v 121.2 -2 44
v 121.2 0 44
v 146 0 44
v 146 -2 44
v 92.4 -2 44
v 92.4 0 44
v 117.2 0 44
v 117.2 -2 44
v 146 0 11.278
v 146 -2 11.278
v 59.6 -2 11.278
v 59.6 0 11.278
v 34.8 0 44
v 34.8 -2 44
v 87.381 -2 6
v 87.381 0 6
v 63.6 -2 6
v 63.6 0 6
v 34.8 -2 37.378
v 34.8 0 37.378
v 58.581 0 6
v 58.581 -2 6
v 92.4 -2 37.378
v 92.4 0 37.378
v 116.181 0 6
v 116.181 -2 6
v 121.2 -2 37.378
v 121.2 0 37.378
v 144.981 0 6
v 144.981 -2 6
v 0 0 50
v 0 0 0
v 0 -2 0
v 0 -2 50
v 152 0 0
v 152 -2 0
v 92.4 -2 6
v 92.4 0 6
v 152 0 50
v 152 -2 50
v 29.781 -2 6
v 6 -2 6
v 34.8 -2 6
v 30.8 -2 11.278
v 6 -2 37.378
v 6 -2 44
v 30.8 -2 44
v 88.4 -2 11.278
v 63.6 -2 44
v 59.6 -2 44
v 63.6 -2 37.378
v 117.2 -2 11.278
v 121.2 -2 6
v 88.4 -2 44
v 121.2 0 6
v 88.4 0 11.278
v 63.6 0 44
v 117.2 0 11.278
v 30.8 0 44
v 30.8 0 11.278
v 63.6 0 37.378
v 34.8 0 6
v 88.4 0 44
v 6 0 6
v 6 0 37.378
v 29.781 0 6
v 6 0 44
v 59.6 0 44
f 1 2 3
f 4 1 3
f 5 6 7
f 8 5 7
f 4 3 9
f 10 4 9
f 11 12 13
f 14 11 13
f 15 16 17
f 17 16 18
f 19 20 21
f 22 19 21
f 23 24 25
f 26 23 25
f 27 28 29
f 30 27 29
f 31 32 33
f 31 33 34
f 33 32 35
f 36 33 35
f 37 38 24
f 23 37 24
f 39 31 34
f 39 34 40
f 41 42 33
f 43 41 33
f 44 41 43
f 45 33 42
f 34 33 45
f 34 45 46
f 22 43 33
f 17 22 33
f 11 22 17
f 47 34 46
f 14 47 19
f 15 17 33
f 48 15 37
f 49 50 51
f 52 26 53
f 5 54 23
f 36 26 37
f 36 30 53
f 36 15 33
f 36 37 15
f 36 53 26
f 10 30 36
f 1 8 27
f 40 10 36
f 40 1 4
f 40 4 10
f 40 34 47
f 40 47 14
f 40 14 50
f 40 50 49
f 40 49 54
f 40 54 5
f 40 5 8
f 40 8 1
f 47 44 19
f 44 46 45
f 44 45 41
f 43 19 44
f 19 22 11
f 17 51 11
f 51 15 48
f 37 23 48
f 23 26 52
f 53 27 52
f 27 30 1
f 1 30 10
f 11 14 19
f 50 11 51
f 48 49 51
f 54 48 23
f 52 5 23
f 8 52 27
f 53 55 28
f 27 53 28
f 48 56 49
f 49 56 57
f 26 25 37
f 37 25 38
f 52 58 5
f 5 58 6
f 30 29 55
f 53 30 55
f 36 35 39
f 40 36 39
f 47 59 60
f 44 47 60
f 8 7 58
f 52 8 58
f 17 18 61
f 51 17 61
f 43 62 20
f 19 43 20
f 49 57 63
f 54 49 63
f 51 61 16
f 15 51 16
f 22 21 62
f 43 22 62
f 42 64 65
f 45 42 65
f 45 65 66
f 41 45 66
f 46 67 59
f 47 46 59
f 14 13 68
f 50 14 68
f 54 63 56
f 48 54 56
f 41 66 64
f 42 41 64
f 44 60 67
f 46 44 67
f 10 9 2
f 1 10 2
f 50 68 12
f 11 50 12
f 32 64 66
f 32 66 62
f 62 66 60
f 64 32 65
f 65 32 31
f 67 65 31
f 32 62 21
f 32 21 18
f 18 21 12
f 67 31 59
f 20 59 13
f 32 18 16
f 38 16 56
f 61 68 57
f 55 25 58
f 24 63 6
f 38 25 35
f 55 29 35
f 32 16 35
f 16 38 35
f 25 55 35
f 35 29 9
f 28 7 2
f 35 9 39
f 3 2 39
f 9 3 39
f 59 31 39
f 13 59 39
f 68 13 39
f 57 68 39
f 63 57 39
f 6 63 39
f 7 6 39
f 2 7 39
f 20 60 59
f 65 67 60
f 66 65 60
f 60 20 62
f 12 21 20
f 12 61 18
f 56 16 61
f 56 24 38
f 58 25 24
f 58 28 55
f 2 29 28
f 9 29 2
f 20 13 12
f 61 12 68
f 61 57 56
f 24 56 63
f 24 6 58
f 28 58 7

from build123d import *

# Parameters (mm, degrees)
F0_W     = 152
F0_H     = 50
F1_DEPTH = 2


with BuildPart() as f1:
    # F0 (on Front) → F1 (new body)
    with BuildSketch(Plane.XZ):
        with Locations((76, 25)):
            Rectangle(F0_W, F0_H)
        Polygon((29.780989, 6), (6, 6), (6, 37.377694), (6, 44), (30.8, 44), (34.8, 44), (59.6, 44), (63.6, 44), (88.4, 44), (92.4, 44), (117.2, 44), (121.2, 44), (146, 44), (150, 44), (150, 6), (144.980989, 6), (121.2, 6), (116.180989, 6), (92.4, 6), (87.380989, 6), (63.6, 6), (58.580989, 6), (34.8, 6), align=None, mode=Mode.SUBTRACT)
        Polygon((121.2, 37.377694), (144.980989, 6), (150, 6), (146, 11.277778), (121.2, 44), align=None)
        Polygon((117.2, 11.277778), (121.2, 6), (121.2, 37.377694), (121.2, 44), (117.2, 44), align=None)
        Polygon((92.4, 37.377694), (116.180989, 6), (121.2, 6), (117.2, 11.277778), (92.4, 44), align=None)
        Polygon((88.4, 11.277778), (92.4, 6), (92.4, 37.377694), (92.4, 44), (88.4, 44), align=None)
        Polygon((63.6, 37.377694), (87.380989, 6), (92.4, 6), (88.4, 11.277778), (63.6, 44), align=None)
        Polygon((59.6, 11.277778), (63.6, 6), (63.6, 37.377694), (63.6, 44), (59.6, 44), align=None)
        Polygon((34.8, 37.377694), (58.580989, 6), (63.6, 6), (59.6, 11.277778), (34.8, 44), align=None)
        Polygon((30.8, 11.277778), (34.8, 6), (34.8, 37.377694), (34.8, 44), (30.8, 44), align=None)
        Polygon((6, 37.377694), (29.780989, 6), (34.8, 6), (30.8, 11.277778), (6, 44), align=None)
        Polygon((146, 11.277778), (150, 6), (150, 44), (146, 44), align=None)
    extrude(amount=F1_DEPTH)


solid = f1.part
